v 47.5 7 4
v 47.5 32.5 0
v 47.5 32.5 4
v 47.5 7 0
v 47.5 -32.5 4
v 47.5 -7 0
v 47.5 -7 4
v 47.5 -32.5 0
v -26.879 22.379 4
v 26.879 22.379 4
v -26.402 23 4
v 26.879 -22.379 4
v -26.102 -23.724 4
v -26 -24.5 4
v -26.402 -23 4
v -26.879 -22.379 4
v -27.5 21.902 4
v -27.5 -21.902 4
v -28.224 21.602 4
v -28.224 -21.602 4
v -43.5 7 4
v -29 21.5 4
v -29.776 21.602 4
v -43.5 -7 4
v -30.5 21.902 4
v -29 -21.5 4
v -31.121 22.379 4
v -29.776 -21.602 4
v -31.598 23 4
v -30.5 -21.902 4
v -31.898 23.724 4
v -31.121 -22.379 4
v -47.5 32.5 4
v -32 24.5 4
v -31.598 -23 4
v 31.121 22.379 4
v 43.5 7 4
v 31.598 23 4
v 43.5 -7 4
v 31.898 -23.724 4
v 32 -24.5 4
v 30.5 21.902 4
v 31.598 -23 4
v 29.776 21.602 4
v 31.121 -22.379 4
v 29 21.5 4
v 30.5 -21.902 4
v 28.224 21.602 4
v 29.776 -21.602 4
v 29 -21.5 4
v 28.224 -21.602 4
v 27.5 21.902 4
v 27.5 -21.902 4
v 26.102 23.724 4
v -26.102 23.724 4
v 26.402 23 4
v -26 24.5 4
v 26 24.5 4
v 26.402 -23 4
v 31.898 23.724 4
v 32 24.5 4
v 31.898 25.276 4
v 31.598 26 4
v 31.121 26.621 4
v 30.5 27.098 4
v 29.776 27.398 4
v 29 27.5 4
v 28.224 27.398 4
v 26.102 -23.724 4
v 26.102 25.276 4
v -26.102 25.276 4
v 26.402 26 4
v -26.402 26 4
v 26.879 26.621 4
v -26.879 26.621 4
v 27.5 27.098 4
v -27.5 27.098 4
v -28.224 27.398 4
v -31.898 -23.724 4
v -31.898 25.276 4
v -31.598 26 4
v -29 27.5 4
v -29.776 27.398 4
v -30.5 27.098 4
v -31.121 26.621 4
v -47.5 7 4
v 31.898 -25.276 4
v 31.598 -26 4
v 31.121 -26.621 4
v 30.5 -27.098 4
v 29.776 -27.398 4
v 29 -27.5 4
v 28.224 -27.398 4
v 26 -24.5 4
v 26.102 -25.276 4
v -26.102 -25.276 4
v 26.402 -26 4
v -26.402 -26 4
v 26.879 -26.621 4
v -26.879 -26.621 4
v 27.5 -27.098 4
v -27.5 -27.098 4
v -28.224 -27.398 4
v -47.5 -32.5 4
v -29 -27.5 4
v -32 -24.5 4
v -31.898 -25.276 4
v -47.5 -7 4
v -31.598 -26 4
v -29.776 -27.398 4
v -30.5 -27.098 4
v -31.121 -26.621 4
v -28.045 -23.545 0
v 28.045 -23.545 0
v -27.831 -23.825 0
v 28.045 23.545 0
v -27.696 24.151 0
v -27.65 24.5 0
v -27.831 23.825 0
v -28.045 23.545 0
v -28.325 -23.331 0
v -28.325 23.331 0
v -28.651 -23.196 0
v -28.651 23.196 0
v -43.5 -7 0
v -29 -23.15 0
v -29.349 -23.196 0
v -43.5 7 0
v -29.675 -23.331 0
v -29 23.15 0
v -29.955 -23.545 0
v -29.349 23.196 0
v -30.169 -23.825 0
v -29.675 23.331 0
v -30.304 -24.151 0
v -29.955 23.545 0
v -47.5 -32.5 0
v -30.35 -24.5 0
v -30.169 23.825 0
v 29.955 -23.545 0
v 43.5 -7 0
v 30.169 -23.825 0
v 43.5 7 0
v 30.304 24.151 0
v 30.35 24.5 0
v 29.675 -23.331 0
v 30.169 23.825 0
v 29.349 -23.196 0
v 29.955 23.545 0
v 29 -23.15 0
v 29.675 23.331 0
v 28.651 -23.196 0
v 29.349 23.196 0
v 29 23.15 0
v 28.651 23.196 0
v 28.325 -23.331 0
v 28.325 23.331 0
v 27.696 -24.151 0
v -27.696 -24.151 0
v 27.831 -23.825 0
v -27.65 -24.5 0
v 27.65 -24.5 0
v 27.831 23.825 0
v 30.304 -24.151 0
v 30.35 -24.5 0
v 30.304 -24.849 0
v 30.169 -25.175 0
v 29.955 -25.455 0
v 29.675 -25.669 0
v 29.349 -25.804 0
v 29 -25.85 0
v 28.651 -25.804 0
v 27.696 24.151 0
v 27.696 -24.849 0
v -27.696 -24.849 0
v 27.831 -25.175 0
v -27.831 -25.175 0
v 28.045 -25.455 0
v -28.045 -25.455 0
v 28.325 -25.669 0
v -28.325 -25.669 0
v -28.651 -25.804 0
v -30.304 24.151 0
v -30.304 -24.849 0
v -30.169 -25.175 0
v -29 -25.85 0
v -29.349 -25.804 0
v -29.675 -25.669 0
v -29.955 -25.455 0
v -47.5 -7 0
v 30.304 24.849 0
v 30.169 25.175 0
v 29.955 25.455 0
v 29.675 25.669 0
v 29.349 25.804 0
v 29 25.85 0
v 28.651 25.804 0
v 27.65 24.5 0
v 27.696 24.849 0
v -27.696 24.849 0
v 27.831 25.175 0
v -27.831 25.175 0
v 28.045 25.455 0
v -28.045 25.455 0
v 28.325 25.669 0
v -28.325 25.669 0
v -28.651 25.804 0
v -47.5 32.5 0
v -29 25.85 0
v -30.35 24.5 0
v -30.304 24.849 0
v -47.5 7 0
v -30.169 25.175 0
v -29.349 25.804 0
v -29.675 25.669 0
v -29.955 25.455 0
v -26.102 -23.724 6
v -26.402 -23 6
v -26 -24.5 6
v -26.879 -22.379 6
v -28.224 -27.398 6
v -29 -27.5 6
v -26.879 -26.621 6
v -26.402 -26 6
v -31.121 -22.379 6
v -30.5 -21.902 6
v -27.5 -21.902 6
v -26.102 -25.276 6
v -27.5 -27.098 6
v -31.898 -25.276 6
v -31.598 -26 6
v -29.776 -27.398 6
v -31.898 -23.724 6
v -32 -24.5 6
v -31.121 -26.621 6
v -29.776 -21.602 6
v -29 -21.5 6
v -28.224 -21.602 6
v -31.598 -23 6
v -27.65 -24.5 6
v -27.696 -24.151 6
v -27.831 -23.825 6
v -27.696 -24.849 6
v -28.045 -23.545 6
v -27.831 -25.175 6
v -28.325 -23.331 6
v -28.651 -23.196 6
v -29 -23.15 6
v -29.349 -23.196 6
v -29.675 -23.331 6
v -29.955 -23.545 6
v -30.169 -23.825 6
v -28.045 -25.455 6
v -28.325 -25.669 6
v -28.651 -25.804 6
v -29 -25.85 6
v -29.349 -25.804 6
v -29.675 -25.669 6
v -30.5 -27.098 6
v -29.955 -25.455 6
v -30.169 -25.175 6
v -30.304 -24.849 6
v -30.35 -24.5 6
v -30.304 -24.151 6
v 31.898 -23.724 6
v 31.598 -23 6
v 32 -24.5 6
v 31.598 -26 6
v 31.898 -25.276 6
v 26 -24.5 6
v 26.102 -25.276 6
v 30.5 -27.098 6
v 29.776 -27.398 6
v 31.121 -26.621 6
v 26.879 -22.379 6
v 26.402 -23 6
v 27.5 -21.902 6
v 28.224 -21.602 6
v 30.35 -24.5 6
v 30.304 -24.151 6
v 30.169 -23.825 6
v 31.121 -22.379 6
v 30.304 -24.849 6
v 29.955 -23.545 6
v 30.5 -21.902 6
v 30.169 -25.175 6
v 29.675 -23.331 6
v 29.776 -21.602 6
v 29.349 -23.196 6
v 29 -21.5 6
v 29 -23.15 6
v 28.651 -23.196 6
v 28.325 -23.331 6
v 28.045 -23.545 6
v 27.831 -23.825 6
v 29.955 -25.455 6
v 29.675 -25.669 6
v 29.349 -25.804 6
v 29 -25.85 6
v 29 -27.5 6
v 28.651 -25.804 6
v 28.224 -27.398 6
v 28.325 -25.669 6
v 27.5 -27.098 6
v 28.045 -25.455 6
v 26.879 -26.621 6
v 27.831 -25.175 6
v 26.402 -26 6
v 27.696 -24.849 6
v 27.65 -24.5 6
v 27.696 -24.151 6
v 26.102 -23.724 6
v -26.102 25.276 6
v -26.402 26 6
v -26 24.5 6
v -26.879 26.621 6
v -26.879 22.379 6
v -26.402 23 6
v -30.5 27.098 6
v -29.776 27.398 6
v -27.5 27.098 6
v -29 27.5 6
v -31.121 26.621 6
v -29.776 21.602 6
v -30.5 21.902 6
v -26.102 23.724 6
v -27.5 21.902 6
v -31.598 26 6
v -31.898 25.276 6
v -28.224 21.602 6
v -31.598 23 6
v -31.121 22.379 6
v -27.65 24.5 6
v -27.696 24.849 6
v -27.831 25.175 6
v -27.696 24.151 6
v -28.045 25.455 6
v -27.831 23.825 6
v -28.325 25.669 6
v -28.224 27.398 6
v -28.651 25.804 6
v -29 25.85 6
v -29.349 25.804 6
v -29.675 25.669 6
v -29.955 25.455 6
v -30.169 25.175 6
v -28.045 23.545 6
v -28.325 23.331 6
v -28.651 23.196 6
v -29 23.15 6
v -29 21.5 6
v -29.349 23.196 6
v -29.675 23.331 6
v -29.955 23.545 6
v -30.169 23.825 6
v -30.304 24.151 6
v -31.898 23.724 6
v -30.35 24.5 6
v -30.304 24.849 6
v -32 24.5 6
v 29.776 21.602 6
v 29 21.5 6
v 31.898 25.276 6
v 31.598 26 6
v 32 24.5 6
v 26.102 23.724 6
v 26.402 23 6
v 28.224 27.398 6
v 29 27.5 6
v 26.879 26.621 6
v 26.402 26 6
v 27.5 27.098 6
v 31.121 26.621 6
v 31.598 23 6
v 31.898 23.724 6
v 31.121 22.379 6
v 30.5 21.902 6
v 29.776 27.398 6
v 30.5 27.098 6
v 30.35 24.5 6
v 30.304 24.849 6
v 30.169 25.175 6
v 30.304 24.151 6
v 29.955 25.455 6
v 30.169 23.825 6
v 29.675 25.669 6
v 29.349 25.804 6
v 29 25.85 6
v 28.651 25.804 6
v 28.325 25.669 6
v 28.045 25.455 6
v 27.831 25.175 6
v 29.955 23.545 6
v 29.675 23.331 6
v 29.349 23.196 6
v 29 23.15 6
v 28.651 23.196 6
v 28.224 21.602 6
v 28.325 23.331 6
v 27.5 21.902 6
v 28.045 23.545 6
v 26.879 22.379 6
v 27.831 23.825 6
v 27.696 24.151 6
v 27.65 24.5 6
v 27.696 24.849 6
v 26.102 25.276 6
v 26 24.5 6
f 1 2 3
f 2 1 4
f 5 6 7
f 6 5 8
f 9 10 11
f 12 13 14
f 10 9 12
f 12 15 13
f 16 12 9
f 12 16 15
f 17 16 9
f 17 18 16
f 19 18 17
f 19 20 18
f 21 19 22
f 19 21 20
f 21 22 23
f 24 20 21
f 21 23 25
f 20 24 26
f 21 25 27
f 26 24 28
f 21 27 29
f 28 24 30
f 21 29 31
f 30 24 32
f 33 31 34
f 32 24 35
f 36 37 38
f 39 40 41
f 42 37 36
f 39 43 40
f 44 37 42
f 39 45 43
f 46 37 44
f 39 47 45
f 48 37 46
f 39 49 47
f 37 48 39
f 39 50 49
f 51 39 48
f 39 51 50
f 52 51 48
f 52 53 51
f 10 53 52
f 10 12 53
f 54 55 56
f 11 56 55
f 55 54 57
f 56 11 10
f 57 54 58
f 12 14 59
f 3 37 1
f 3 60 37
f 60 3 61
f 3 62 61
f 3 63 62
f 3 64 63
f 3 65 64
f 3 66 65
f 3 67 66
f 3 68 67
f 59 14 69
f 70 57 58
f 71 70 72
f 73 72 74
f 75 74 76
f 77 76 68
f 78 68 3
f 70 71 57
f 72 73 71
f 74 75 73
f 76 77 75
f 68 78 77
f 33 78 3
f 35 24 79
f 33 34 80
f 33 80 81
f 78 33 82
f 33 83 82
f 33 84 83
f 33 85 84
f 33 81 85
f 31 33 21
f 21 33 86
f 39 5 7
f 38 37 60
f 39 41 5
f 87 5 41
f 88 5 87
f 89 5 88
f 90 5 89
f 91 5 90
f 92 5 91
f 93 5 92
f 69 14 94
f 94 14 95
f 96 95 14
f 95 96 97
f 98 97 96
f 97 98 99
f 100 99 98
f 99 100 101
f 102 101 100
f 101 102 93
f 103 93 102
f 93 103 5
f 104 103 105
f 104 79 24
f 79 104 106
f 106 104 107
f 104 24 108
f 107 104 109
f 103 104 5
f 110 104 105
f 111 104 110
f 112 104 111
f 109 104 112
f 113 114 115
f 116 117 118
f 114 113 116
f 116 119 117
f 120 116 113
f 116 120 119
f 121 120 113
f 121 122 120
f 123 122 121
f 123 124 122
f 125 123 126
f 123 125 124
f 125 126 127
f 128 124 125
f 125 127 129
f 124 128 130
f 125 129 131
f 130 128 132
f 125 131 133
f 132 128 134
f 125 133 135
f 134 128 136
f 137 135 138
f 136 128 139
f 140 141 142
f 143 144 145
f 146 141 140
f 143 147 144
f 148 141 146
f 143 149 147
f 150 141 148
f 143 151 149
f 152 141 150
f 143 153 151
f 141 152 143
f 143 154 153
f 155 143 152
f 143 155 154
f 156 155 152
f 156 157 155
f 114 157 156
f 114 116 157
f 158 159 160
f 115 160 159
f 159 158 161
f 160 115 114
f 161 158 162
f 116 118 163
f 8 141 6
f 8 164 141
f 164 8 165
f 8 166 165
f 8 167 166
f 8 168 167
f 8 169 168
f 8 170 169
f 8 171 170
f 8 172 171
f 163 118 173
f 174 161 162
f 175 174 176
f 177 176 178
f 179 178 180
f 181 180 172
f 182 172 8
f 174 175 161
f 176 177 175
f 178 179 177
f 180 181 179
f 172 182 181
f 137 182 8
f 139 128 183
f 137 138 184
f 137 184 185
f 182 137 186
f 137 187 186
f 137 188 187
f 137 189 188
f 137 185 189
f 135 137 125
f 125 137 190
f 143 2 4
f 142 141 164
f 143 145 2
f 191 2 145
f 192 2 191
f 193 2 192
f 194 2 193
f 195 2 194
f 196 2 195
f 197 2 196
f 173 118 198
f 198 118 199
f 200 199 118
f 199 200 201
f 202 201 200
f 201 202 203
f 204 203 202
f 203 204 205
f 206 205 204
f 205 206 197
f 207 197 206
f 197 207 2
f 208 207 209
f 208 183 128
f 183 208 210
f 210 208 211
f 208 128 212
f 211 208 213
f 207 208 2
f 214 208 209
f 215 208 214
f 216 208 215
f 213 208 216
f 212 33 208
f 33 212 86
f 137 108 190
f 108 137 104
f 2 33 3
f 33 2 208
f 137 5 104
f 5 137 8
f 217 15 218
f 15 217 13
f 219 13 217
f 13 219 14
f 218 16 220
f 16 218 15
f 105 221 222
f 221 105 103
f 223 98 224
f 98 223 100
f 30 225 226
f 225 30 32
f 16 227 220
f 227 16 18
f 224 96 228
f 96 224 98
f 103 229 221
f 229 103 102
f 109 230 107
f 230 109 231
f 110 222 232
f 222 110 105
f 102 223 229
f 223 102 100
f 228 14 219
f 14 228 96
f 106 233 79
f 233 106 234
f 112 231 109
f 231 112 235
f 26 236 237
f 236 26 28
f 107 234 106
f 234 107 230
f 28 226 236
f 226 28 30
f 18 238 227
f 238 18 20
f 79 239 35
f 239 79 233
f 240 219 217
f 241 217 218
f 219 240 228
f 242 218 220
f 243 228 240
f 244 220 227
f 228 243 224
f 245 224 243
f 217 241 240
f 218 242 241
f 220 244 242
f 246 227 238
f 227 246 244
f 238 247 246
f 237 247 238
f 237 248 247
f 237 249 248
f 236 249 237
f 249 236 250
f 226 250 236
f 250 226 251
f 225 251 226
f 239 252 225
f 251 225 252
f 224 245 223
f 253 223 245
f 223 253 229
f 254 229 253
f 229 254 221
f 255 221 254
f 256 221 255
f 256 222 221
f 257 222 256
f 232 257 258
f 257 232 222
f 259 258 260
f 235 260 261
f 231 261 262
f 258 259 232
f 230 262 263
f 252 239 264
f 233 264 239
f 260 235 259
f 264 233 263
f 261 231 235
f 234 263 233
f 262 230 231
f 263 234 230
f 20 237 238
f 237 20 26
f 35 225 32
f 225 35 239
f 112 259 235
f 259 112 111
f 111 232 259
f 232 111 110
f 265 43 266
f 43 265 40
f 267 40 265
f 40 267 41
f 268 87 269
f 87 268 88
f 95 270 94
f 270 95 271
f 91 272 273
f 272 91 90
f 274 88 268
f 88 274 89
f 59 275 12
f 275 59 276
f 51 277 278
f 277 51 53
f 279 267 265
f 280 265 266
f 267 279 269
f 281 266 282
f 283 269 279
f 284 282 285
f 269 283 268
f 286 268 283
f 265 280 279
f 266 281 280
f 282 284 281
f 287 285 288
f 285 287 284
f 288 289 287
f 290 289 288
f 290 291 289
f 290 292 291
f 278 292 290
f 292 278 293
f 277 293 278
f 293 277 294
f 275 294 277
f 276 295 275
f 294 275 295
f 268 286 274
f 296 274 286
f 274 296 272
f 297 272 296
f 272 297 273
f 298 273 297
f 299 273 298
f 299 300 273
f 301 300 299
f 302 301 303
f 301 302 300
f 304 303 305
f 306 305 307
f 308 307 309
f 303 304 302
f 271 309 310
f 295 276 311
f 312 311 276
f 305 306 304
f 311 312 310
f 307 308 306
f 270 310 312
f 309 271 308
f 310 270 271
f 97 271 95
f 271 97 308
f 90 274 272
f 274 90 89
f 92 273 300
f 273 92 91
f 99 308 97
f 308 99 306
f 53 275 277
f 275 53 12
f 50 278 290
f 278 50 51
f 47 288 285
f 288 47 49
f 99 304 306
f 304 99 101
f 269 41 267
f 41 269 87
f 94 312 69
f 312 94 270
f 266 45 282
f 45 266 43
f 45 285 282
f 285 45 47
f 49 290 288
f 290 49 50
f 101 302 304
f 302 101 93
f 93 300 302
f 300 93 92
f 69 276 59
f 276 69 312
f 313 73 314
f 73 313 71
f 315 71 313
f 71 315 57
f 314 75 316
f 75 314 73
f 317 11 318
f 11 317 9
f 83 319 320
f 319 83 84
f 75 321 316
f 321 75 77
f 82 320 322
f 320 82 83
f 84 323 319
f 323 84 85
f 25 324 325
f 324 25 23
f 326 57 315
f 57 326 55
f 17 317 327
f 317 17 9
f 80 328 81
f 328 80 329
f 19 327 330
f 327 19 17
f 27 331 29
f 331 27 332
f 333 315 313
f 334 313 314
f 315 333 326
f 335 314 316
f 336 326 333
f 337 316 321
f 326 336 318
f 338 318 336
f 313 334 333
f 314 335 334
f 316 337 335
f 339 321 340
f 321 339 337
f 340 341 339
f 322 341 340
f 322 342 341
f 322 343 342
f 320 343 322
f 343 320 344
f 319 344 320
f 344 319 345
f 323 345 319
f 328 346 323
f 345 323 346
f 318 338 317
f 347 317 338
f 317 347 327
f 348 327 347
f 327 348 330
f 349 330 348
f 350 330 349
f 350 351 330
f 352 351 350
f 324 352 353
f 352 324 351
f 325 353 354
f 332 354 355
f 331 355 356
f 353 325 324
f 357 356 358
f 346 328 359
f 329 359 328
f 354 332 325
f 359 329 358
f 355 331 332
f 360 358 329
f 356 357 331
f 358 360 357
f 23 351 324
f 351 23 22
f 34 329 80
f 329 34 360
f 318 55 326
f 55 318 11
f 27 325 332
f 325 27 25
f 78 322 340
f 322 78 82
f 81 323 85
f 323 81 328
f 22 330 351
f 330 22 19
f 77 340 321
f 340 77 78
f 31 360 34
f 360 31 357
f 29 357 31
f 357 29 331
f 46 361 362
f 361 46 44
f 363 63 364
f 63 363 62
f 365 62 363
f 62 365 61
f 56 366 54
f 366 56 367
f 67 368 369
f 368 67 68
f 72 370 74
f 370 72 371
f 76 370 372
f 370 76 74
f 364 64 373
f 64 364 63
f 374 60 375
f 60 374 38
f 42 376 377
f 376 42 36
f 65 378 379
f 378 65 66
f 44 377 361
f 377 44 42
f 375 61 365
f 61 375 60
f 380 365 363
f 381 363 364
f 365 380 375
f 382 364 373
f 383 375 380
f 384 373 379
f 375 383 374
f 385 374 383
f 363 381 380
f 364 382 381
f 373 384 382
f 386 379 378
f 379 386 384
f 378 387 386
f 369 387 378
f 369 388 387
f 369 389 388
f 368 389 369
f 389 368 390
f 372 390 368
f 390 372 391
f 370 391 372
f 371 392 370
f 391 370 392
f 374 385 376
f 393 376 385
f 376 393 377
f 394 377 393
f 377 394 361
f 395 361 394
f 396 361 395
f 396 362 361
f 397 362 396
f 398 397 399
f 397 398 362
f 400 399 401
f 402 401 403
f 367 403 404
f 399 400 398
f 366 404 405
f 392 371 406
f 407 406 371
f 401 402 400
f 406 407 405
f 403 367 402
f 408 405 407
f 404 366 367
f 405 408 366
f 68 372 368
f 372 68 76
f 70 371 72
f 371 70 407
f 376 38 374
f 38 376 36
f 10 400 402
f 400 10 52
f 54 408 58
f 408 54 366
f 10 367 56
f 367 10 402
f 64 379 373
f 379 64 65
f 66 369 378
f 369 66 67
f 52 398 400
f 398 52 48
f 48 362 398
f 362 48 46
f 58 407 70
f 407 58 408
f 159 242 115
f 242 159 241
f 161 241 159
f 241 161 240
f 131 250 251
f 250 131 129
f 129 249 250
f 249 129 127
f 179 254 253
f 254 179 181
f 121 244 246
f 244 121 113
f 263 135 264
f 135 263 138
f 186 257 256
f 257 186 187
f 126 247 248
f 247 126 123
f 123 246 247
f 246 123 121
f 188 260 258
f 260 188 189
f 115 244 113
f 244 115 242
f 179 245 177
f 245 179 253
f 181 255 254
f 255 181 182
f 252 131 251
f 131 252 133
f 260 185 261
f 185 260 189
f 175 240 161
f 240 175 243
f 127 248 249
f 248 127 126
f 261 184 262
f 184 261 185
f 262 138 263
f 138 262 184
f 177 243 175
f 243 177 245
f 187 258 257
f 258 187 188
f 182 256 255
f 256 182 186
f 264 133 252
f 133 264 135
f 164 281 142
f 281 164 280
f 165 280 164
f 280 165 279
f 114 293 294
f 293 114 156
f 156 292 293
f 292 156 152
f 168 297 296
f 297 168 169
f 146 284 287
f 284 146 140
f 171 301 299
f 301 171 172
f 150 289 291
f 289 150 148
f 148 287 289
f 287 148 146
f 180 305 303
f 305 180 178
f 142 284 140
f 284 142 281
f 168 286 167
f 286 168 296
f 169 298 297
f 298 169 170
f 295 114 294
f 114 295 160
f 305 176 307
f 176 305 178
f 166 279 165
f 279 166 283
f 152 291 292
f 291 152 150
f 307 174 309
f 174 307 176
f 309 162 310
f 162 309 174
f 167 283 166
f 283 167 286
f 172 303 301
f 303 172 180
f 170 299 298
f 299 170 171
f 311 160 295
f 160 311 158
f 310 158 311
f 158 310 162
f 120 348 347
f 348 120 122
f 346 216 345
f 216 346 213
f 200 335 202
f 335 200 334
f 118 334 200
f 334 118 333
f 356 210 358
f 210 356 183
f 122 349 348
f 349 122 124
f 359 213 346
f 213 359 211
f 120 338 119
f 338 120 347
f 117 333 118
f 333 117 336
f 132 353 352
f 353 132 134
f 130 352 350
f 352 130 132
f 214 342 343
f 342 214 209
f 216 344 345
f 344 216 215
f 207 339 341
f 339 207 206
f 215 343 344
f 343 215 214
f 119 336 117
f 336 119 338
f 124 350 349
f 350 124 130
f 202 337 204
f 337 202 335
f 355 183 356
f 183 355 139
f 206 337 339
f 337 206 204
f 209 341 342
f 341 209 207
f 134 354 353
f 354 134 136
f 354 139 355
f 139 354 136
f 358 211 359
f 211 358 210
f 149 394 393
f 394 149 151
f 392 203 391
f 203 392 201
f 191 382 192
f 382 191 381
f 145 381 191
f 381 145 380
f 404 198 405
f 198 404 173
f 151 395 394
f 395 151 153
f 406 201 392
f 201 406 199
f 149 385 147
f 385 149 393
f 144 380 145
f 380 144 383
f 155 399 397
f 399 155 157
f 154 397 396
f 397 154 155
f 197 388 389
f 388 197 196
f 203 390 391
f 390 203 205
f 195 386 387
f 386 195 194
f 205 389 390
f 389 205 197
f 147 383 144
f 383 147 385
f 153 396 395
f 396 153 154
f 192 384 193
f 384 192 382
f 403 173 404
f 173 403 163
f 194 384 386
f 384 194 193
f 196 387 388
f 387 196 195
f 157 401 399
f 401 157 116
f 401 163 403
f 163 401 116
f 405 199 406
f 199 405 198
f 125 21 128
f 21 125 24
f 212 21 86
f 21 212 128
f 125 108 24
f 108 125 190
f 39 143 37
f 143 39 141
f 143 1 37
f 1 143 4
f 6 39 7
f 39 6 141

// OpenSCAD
$fn = 24;

module base_plate() {
    cube([95, 65, 4], center=true);
}

module standoff(height) {
    cylinder(h=height, r=3, center=false);
}

module clearance_hole() {
    cylinder(h=15, r=1.35, center=false);
}

module keyhole_slot() {
    // Keyhole slot: 8mm wide x 14mm long, functional mounting slot
    cube([8, 14, 5], center=true);
}

// Calculate mounting hole positions (centered on 58mm x 49mm pattern)
hole_x_offset = 58 / 2;
hole_y_offset = 49 / 2;

difference() {
    union() {
        // Base plate centered at z=2
        translate([0, 0, 2]) base_plate();
        
        // Four standoffs - union them into the base before drilling
        translate([-hole_x_offset, -hole_y_offset, 0]) 
            standoff(6);
        
        translate([hole_x_offset, -hole_y_offset, 0]) 
            standoff(6);
        
        translate([-hole_x_offset, hole_y_offset, 0]) 
            standoff(6);
        
        translate([hole_x_offset, hole_y_offset, 0]) 
            standoff(6);
    }
    
    // Four clearance holes (M2.5 = 2.7mm) - drilled through standoffs and base
    // Front-left
    translate([-hole_x_offset, -hole_y_offset, 0]) 
        clearance_hole();
    
    // Front-right
    translate([hole_x_offset, -hole_y_offset, 0]) 
        clearance_hole();
    
    // Back-left
    translate([-hole_x_offset, hole_y_offset, 0]) 
        clearance_hole();
    
    // Back-right
    translate([hole_x_offset, hole_y_offset, 0]) 
        clearance_hole();
    
    // Two keyhole slots on short edges (65mm side)
    // Left edge keyhole
    translate([-47.5, 0, 2]) 
        keyhole_slot();
    
    // Right edge keyhole
    translate([47.5, 0, 2]) 
        keyhole_slot();
}
